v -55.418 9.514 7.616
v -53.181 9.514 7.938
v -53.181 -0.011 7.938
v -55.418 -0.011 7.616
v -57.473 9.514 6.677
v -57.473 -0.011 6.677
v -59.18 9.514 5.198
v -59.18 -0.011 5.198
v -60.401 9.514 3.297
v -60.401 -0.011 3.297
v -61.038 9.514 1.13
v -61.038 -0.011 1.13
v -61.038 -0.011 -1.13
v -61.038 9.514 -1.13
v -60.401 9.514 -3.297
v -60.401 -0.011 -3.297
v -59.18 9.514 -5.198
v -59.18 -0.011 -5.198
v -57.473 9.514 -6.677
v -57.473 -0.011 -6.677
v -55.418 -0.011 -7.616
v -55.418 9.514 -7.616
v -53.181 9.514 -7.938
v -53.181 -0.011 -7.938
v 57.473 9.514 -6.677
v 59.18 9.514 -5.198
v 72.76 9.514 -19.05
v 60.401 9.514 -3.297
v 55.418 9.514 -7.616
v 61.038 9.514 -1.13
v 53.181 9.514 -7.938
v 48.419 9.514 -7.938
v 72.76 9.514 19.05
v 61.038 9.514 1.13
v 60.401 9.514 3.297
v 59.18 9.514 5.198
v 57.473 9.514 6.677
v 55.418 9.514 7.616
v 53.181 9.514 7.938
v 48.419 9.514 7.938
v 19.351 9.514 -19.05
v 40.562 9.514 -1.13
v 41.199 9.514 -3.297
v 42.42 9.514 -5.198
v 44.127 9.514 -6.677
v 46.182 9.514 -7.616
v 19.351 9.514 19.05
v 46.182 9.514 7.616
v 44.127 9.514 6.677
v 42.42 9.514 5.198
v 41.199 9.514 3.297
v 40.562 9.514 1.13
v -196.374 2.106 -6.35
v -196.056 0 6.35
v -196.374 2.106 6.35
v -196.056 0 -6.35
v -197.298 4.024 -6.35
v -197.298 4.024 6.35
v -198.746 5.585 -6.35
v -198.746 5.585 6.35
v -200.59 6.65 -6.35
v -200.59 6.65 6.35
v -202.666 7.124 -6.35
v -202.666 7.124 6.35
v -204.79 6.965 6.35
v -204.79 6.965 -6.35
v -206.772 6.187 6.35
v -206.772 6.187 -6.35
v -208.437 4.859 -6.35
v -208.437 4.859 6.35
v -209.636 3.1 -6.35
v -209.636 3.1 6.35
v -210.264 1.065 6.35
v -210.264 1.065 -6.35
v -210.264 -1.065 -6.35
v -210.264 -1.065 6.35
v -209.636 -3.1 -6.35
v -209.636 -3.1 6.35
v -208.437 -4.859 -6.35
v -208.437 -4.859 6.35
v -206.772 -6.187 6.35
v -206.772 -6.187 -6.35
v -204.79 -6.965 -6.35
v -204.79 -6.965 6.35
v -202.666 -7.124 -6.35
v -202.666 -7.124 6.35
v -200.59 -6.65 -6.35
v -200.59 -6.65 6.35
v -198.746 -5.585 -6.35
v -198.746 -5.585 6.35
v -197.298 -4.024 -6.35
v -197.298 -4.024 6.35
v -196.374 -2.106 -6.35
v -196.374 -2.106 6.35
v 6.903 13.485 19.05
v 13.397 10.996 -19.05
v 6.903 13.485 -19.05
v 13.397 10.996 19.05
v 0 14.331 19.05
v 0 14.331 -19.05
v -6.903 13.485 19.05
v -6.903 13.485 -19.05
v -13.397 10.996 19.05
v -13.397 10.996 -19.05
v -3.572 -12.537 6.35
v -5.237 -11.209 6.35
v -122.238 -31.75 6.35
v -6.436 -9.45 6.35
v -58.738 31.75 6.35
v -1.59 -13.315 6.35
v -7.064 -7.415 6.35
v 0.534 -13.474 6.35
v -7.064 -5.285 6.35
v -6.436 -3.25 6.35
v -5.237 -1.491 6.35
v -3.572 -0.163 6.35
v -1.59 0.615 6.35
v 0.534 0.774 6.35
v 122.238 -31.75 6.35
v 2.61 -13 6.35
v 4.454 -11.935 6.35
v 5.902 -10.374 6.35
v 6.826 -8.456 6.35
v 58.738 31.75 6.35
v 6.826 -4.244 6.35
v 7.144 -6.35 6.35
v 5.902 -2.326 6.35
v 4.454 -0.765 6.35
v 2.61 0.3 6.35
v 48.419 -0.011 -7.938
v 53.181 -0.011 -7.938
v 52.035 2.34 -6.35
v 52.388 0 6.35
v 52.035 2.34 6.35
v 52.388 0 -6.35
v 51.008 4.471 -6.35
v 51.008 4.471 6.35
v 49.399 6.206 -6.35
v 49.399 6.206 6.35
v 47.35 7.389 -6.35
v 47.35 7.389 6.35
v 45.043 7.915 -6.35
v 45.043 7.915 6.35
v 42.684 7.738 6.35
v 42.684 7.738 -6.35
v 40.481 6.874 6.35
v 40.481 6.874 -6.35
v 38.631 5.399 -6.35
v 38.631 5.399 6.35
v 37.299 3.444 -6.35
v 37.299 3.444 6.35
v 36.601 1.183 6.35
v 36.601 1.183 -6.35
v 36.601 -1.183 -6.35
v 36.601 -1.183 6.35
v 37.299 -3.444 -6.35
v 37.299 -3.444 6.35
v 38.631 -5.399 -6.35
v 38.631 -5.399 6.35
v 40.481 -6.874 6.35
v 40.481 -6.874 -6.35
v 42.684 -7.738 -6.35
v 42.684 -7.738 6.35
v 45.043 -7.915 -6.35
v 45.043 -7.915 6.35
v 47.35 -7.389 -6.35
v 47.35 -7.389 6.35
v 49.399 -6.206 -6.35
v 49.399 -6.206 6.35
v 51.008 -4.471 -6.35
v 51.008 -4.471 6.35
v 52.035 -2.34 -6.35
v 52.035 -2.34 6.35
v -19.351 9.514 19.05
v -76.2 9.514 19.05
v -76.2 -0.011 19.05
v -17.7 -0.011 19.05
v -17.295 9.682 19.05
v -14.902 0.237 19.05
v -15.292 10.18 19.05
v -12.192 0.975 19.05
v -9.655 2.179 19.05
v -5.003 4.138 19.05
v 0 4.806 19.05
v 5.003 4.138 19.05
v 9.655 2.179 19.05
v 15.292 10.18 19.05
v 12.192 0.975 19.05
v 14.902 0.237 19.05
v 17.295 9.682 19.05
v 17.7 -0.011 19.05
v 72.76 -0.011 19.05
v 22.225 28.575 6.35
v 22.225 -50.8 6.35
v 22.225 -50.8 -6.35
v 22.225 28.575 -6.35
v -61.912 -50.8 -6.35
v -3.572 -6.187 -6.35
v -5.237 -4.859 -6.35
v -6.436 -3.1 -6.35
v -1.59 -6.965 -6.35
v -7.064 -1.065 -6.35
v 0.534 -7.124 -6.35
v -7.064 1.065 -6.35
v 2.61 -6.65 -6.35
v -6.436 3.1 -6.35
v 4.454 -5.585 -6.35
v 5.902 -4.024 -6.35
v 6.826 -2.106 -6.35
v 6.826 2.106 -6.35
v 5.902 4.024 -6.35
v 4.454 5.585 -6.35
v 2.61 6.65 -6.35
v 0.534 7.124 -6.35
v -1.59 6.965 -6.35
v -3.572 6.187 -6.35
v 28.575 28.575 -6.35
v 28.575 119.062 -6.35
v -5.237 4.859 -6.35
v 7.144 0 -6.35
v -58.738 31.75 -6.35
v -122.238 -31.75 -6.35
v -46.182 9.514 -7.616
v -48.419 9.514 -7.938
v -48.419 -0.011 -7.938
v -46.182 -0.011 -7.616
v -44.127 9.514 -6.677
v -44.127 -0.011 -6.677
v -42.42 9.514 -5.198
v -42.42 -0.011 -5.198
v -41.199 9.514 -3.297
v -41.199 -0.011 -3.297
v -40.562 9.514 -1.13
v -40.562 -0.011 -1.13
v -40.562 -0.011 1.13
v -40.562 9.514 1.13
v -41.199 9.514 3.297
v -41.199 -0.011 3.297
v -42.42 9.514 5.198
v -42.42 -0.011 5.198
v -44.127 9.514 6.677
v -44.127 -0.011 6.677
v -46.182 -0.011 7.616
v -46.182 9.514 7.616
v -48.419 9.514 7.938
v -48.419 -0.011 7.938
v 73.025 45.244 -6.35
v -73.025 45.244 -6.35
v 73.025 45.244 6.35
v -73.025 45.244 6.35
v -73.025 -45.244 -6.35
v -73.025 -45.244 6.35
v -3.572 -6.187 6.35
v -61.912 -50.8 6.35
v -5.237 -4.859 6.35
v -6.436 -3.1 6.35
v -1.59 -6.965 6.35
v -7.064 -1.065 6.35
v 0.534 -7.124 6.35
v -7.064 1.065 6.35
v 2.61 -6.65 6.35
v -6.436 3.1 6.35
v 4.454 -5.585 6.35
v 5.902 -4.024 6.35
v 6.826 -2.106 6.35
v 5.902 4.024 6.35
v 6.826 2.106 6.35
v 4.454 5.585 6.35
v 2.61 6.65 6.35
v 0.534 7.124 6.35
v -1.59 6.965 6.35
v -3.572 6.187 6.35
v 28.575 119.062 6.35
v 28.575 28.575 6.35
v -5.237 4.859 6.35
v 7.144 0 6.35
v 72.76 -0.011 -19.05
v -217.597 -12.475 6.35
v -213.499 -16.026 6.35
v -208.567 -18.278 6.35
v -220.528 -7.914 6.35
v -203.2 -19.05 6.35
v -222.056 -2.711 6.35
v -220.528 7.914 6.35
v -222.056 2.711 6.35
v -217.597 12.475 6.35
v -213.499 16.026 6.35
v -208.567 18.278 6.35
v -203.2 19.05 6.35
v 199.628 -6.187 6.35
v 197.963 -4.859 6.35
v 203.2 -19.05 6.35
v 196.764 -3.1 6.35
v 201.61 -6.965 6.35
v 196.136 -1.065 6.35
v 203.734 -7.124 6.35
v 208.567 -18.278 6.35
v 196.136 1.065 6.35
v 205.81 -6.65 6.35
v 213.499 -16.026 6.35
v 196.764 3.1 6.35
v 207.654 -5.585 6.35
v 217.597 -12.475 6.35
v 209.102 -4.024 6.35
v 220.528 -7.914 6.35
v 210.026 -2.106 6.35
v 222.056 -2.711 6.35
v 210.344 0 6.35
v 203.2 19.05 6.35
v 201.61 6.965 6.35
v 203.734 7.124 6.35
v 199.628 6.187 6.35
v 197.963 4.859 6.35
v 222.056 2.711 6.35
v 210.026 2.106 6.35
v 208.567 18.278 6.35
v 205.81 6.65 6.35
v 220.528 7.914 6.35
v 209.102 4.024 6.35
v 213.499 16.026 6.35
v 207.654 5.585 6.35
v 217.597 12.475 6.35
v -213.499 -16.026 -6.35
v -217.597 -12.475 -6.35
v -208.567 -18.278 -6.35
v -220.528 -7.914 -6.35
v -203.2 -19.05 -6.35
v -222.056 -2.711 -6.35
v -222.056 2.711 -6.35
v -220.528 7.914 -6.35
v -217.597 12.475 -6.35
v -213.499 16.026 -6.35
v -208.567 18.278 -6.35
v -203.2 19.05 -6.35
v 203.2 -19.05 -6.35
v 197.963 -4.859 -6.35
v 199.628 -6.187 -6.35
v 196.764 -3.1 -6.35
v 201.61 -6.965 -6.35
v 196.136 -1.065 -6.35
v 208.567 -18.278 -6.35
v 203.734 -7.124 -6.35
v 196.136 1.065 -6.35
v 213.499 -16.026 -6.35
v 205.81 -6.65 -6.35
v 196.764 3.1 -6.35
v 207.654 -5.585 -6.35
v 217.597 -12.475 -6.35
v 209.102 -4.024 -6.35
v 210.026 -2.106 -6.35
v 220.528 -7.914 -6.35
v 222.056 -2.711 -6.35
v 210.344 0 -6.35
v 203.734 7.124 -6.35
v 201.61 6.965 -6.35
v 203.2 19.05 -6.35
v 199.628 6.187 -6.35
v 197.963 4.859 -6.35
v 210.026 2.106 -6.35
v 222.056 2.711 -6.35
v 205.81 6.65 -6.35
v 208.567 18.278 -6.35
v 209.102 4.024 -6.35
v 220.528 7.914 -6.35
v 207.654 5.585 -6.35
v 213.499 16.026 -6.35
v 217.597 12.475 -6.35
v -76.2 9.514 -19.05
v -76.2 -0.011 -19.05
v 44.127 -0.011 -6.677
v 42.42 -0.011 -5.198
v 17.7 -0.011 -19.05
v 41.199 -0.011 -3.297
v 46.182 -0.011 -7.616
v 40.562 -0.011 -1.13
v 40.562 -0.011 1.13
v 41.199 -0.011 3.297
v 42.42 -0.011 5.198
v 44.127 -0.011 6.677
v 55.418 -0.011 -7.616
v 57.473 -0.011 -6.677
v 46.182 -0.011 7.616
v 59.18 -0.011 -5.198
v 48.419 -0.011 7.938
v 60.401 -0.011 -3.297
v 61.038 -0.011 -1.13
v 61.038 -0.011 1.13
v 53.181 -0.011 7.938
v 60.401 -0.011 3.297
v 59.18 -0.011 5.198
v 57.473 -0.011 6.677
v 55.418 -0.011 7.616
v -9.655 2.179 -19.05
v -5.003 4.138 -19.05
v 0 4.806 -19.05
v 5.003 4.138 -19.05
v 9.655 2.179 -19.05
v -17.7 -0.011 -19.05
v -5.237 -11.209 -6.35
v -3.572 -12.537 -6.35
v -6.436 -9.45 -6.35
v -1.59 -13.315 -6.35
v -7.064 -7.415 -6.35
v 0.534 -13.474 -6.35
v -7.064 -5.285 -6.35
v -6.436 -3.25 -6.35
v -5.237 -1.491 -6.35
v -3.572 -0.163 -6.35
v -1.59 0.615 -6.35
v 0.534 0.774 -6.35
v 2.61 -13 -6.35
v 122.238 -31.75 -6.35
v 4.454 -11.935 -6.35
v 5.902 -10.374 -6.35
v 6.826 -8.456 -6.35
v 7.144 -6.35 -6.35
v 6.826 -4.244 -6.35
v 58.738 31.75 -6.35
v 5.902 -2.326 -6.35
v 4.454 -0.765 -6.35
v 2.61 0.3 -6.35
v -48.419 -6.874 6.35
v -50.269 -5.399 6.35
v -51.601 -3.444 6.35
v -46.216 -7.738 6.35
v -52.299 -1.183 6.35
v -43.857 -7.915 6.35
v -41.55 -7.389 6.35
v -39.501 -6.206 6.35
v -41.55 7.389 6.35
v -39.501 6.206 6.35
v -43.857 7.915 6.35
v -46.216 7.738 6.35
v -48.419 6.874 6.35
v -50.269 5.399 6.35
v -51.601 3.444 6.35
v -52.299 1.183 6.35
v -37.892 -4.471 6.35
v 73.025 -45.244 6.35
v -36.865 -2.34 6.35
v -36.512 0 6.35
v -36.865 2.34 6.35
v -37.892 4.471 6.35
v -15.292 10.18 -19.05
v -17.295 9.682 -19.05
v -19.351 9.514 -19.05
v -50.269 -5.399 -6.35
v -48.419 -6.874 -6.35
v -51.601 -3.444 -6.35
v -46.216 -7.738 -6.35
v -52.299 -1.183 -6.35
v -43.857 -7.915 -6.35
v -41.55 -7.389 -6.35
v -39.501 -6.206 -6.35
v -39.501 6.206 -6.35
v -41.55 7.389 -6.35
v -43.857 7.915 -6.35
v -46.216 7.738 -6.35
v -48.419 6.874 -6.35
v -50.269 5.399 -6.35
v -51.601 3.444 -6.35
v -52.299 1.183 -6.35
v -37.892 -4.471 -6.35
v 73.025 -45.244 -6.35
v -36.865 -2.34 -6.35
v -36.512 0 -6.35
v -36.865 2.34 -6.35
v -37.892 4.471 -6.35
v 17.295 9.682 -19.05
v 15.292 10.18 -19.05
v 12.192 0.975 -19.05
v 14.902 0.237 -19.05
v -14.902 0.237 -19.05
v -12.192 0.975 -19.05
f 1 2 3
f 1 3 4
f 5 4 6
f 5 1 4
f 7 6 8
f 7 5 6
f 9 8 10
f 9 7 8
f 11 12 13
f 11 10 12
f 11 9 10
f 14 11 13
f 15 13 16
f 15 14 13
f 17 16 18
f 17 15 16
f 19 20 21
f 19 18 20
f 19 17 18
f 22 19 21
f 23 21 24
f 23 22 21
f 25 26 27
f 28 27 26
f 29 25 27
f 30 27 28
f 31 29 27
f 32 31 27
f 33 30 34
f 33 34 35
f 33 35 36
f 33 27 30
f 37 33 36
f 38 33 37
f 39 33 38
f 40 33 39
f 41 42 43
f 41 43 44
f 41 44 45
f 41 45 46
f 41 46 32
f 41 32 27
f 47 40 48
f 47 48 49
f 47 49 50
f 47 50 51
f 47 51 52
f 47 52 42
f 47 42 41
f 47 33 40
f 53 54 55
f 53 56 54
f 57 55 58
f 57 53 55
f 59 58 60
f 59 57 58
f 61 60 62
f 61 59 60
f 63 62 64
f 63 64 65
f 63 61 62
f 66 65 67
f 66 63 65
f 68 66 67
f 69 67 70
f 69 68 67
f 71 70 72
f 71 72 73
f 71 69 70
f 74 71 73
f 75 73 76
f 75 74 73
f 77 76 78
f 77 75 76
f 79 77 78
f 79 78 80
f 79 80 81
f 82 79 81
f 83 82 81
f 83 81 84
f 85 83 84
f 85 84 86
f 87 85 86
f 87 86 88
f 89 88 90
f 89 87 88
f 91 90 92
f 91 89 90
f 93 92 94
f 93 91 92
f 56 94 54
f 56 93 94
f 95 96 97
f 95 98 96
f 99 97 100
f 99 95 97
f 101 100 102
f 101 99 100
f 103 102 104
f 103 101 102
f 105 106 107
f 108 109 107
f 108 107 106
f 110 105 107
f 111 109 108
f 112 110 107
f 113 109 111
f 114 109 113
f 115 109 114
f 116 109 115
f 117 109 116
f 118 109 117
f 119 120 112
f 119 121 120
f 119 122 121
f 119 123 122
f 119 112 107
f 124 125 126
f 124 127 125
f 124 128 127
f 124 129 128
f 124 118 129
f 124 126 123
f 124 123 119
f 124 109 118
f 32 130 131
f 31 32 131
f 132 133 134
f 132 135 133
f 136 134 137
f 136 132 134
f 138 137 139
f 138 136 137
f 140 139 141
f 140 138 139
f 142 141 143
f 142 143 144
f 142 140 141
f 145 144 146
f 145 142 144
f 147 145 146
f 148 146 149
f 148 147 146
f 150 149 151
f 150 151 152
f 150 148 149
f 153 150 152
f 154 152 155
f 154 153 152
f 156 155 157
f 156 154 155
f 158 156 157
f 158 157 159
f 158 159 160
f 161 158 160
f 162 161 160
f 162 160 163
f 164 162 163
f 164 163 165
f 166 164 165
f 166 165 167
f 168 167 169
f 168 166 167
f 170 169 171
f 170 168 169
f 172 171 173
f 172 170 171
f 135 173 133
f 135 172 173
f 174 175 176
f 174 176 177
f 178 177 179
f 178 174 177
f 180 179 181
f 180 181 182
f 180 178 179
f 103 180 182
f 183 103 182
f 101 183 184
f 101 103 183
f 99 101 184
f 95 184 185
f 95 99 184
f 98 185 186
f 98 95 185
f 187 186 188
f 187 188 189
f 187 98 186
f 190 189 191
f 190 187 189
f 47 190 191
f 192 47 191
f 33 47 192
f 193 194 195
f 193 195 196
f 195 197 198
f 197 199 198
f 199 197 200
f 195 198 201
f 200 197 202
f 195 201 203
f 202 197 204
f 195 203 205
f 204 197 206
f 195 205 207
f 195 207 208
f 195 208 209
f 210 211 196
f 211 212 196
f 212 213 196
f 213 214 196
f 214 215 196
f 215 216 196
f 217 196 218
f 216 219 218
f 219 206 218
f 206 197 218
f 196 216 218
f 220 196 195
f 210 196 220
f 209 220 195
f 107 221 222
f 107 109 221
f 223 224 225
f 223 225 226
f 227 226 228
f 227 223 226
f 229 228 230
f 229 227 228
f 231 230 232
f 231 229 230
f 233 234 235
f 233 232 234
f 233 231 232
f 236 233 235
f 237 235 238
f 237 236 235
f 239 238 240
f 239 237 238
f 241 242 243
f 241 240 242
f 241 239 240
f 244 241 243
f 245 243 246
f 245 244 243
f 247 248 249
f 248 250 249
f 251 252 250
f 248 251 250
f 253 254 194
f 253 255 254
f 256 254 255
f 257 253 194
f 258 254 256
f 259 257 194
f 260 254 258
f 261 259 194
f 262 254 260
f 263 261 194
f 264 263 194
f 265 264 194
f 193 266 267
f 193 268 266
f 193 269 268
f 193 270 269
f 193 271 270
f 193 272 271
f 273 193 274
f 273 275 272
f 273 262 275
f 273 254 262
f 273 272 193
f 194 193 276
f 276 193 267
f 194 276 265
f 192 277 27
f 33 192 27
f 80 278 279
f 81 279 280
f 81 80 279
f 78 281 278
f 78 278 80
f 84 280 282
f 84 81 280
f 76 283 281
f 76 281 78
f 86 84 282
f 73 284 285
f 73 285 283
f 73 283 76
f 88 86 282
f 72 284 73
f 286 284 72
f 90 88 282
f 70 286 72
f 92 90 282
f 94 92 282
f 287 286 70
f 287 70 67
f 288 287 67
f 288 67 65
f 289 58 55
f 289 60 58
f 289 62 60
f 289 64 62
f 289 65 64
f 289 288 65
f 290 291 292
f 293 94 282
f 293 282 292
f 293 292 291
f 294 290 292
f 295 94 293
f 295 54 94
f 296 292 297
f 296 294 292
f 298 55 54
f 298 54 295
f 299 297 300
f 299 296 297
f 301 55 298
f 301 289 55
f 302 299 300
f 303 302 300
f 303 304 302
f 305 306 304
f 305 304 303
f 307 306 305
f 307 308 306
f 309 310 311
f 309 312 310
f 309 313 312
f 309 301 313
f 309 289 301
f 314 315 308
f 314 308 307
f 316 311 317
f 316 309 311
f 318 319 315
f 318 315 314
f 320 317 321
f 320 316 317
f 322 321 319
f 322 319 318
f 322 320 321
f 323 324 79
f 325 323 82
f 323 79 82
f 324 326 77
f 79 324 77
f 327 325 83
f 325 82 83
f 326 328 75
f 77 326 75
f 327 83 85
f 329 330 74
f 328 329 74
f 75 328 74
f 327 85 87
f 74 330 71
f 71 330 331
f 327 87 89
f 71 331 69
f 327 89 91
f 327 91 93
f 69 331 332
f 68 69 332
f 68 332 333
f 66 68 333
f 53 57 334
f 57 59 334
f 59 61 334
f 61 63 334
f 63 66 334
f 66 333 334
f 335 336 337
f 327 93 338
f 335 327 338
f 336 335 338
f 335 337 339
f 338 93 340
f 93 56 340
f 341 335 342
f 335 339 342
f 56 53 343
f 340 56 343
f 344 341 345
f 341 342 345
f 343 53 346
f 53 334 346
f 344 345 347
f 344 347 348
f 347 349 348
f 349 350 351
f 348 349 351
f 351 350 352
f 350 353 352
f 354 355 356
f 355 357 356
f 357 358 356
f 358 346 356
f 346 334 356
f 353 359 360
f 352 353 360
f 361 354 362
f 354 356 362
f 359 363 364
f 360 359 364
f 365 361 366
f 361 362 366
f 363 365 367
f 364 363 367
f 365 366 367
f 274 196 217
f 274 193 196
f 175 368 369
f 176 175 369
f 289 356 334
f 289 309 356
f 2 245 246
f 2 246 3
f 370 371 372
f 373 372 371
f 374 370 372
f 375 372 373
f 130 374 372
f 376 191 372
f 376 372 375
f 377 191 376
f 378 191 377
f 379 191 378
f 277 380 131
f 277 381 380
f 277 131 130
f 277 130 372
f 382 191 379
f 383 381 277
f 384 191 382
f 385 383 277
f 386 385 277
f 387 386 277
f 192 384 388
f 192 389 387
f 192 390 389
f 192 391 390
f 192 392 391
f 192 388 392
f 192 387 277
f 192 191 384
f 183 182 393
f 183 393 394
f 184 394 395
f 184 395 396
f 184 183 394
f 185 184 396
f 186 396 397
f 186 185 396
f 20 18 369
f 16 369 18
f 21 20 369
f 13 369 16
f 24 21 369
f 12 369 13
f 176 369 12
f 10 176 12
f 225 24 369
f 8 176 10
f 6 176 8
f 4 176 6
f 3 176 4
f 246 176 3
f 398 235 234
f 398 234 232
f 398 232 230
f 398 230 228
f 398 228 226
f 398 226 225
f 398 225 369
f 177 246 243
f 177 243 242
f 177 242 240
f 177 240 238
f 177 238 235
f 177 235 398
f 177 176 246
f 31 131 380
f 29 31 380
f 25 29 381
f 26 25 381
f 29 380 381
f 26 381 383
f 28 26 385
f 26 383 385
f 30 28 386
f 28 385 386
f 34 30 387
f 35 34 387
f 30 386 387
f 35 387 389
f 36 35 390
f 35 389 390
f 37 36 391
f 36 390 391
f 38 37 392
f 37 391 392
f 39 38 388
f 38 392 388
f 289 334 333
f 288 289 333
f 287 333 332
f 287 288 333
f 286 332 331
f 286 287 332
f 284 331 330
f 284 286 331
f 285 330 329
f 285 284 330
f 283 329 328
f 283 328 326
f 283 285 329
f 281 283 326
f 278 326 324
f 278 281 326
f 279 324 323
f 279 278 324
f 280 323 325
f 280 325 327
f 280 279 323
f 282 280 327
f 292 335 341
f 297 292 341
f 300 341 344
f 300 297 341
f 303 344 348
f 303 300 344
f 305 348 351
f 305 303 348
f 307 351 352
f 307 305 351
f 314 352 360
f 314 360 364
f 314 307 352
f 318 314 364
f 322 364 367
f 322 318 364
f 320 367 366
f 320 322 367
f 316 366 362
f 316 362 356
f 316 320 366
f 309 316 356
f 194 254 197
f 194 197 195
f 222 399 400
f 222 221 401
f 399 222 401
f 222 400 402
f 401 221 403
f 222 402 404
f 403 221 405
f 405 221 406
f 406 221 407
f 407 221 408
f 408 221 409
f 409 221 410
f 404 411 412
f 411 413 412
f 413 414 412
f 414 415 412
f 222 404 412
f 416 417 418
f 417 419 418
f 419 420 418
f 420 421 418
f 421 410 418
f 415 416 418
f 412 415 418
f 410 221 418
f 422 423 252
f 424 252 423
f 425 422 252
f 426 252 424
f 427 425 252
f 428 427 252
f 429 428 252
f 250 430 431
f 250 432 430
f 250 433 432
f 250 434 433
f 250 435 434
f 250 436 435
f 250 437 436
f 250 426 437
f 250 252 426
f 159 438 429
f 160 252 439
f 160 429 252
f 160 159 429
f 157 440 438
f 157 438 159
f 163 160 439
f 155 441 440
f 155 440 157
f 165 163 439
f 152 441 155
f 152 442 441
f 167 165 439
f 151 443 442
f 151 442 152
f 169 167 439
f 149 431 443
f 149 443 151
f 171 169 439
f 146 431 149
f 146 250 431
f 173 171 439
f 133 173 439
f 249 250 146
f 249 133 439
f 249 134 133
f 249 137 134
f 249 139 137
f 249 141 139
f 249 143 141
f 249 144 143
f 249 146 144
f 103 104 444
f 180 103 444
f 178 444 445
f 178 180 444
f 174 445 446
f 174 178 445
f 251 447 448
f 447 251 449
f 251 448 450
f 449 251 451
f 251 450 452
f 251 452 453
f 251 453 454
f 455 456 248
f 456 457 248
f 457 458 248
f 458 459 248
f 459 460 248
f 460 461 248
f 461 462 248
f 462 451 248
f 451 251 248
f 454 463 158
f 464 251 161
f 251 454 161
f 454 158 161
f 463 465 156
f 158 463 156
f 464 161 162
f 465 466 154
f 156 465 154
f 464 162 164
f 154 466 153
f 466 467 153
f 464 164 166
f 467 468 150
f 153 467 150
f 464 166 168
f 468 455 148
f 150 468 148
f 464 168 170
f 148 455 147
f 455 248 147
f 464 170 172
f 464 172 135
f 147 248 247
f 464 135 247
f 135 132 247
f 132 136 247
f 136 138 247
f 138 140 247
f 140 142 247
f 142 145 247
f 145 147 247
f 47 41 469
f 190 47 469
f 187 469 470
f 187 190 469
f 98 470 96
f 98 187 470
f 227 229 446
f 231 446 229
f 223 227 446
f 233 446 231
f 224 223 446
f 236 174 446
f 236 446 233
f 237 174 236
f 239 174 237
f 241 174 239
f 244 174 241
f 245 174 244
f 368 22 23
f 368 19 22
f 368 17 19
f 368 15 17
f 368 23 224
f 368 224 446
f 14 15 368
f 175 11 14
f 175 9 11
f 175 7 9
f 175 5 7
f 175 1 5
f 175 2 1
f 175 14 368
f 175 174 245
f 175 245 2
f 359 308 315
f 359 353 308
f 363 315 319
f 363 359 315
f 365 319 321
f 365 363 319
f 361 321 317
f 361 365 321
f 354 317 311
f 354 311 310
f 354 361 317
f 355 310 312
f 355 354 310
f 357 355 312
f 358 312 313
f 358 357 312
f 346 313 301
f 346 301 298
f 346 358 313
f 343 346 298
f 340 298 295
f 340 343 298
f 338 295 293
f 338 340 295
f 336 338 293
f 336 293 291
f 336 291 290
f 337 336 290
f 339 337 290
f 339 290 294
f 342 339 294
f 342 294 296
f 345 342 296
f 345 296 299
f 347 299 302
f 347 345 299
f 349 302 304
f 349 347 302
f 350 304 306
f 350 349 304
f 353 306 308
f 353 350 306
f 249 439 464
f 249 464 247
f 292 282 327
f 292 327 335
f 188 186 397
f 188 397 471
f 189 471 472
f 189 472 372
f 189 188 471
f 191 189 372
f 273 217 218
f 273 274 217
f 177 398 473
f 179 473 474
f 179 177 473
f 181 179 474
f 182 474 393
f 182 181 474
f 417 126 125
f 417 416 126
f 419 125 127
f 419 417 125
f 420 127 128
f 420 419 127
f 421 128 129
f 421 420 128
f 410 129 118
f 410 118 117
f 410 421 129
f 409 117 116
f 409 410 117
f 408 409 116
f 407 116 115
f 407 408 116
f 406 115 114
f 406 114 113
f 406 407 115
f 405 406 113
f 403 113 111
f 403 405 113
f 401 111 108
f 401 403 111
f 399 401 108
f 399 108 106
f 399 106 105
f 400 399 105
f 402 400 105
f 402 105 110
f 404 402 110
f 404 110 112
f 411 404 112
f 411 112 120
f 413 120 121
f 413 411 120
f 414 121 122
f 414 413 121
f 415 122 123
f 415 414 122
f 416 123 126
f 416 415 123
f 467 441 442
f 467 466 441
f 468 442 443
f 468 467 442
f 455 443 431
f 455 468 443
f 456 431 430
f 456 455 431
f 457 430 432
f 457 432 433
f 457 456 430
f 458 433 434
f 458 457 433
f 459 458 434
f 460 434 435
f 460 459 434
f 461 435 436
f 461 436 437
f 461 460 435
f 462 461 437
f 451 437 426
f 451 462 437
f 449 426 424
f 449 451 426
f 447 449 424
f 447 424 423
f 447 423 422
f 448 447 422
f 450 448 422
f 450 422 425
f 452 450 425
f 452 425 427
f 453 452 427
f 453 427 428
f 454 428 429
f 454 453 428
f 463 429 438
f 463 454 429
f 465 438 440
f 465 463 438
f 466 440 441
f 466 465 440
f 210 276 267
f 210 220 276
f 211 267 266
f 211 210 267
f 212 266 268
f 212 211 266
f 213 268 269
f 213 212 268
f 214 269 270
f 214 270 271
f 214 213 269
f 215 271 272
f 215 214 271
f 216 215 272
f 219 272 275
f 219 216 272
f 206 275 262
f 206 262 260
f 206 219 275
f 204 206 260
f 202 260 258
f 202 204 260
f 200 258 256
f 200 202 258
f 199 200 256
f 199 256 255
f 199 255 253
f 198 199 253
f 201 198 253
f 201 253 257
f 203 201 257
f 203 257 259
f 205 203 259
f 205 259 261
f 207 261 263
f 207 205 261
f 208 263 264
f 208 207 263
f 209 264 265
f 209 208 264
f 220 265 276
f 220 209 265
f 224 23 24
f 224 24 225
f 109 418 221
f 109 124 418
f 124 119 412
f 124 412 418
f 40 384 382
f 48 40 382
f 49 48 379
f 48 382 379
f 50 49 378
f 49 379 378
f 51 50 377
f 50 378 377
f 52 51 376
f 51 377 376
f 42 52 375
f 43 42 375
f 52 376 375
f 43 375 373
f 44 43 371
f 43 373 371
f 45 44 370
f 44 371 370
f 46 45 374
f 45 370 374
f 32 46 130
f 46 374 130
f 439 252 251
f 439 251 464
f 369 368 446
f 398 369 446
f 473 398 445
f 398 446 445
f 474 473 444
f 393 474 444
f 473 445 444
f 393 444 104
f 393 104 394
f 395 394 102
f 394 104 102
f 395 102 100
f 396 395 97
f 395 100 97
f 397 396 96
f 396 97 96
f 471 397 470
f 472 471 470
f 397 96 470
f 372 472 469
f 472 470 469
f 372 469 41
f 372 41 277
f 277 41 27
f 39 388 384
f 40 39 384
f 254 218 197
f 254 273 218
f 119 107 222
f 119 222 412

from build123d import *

# Parameters (mm, degrees)
F0_W      = 146.05
F0_H      = 90.4875
F0_R      = 7.9375
F1_DEPTH  = 6.35
F2_R      = 7.14375
F3_DEPTH  = 6.35
F4_R      = 7.14375
F5_DEPTH  = 6.35
F6_R      = 7.14375
F7_DEPTH  = 6.35
F9_DEPTH  = 19.05
F11_DEPTH = 12.7


with BuildPart() as f1:
    # F0 (on Top) → F1 (new body, symmetric)
    with BuildSketch(Plane.XY):
        Rectangle(F0_W, F0_H)
        with Locations((-44.45, 0)):
            Circle(F0_R, mode=Mode.SUBTRACT)
        with Locations((44.45, 0)):
            Circle(F0_R, mode=Mode.SUBTRACT)
    extrude(amount=F1_DEPTH, both=True)


with BuildPart() as f3:
    # F2 (on Top) → F3 (new body, symmetric)
    with BuildSketch(Plane.XY):
        Polygon((-58.7375, 31.75), (-122.2375, -31.75), (122.2375, -31.75), (58.7375, 31.75), align=None)
        with Locations((0, -6.35)):
            Circle(F2_R, mode=Mode.SUBTRACT)
    extrude(amount=F3_DEPTH, both=True)


with BuildPart() as f5:
    # F4 (on Top) → F5 (new body, symmetric)
    with BuildSketch(Plane.XY):
        Polygon((28.575, 119.0625), (-61.9125, -50.8), (22.225, -50.8), (22.225, 28.575), (28.575, 28.575), align=None)
        Circle(F4_R, mode=Mode.SUBTRACT)
    extrude(amount=F5_DEPTH, both=True)


with BuildPart() as f7:
    # F6 (on Top) → F7 (new body, symmetric)
    with BuildSketch(Plane.XY):
        with BuildLine():
            Line((203.2, 19.05), (-203.2, 19.05))
            ThreePointArc((-203.2, 19.05), (-222.25, 0), (-203.2, -19.05))
            Line((-203.2, -19.05), (203.2, -19.05))
            ThreePointArc((203.2, -19.05), (222.25, 0), (203.2, 19.05))
        make_face()
        with Locations((-203.2, 0)):
            Circle(F6_R, mode=Mode.SUBTRACT)
        with Locations((203.2, 0)):
            Circle(F6_R, mode=Mode.SUBTRACT)
    extrude(amount=F7_DEPTH, both=True)


with BuildPart() as f9:
    # F8 (on Top) → F9 (new body, symmetric)
    with BuildSketch(Plane.XY):
        with BuildLine():
            Line((-19.3512225584, 9.5140125274), (-76.2, 9.5140125274))
            Line((-76.2, 9.5140125274), (-76.2, -0.0109874726))
            Line((-76.2, -0.0109874726), (-17.6999632028, -0.0109874726))
            ThreePointArc((-17.6999632028, -0.0109874726), (-13.5309106507, 0.5462246382), (-9.6545253834, 2.1787447078))
            ThreePointArc((-9.6545253834, 2.1787447078), (0, 4.8064233243), (9.6545253834, 2.1787447078))
            ThreePointArc((9.6545253834, 2.1787447078), (13.5309106507, 0.5462246382), (17.6999632028, -0.0109874726))
            Line((17.6999632028, -0.0109874726), (72.7599636711, -0.0109874726))
            Line((72.7599636711, -0.0109874726), (72.7599636711, 9.5140125274))
            Line((72.7599636711, 9.5140125274), (19.3512225584, 9.5140125274))
            ThreePointArc((19.3512225584, 9.5140125274), (16.2832460987, 9.8901527244), (13.3970002327, 10.9962927726))
            ThreePointArc((13.3970002327, 10.9962927726), (0, 14.3314233243), (-13.3970002327, 10.9962927726))
            ThreePointArc((-13.3970002327, 10.9962927726), (-16.2832460987, 9.8901527244), (-19.3512225584, 9.5140125274))
        make_face()
    extrude(amount=F9_DEPTH, both=True)

    # F10 (on Front) → F11 (cut, symmetric)
    with BuildSketch(Plane.XZ):
        with BuildLine():
            Line((-48.41875, 7.9375), (-53.18125, 7.9375))
            ThreePointArc((-53.18125, 7.9375), (-61.11875, 0), (-53.18125, -7.9375))
            Line((-53.18125, -7.9375), (-48.41875, -7.9375))
            ThreePointArc((-48.41875, -7.9375), (-40.48125, 0), (-48.41875, 7.9375))
        make_face()
        with BuildLine():
            ThreePointArc((48.41875, 7.9375), (40.48125, 0), (48.41875, -7.9375))
            Line((48.41875, -7.9375), (53.18125, -7.9375))
            ThreePointArc((53.18125, -7.9375), (61.11875, 0), (53.18125, 7.9375))
            Line((53.18125, 7.9375), (48.41875, 7.9375))
        make_face()
    extrude(amount=F11_DEPTH, both=True, mode=Mode.SUBTRACT)


solid = Compound([f1.part, f3.part, f5.part, f7.part, f9.part])
